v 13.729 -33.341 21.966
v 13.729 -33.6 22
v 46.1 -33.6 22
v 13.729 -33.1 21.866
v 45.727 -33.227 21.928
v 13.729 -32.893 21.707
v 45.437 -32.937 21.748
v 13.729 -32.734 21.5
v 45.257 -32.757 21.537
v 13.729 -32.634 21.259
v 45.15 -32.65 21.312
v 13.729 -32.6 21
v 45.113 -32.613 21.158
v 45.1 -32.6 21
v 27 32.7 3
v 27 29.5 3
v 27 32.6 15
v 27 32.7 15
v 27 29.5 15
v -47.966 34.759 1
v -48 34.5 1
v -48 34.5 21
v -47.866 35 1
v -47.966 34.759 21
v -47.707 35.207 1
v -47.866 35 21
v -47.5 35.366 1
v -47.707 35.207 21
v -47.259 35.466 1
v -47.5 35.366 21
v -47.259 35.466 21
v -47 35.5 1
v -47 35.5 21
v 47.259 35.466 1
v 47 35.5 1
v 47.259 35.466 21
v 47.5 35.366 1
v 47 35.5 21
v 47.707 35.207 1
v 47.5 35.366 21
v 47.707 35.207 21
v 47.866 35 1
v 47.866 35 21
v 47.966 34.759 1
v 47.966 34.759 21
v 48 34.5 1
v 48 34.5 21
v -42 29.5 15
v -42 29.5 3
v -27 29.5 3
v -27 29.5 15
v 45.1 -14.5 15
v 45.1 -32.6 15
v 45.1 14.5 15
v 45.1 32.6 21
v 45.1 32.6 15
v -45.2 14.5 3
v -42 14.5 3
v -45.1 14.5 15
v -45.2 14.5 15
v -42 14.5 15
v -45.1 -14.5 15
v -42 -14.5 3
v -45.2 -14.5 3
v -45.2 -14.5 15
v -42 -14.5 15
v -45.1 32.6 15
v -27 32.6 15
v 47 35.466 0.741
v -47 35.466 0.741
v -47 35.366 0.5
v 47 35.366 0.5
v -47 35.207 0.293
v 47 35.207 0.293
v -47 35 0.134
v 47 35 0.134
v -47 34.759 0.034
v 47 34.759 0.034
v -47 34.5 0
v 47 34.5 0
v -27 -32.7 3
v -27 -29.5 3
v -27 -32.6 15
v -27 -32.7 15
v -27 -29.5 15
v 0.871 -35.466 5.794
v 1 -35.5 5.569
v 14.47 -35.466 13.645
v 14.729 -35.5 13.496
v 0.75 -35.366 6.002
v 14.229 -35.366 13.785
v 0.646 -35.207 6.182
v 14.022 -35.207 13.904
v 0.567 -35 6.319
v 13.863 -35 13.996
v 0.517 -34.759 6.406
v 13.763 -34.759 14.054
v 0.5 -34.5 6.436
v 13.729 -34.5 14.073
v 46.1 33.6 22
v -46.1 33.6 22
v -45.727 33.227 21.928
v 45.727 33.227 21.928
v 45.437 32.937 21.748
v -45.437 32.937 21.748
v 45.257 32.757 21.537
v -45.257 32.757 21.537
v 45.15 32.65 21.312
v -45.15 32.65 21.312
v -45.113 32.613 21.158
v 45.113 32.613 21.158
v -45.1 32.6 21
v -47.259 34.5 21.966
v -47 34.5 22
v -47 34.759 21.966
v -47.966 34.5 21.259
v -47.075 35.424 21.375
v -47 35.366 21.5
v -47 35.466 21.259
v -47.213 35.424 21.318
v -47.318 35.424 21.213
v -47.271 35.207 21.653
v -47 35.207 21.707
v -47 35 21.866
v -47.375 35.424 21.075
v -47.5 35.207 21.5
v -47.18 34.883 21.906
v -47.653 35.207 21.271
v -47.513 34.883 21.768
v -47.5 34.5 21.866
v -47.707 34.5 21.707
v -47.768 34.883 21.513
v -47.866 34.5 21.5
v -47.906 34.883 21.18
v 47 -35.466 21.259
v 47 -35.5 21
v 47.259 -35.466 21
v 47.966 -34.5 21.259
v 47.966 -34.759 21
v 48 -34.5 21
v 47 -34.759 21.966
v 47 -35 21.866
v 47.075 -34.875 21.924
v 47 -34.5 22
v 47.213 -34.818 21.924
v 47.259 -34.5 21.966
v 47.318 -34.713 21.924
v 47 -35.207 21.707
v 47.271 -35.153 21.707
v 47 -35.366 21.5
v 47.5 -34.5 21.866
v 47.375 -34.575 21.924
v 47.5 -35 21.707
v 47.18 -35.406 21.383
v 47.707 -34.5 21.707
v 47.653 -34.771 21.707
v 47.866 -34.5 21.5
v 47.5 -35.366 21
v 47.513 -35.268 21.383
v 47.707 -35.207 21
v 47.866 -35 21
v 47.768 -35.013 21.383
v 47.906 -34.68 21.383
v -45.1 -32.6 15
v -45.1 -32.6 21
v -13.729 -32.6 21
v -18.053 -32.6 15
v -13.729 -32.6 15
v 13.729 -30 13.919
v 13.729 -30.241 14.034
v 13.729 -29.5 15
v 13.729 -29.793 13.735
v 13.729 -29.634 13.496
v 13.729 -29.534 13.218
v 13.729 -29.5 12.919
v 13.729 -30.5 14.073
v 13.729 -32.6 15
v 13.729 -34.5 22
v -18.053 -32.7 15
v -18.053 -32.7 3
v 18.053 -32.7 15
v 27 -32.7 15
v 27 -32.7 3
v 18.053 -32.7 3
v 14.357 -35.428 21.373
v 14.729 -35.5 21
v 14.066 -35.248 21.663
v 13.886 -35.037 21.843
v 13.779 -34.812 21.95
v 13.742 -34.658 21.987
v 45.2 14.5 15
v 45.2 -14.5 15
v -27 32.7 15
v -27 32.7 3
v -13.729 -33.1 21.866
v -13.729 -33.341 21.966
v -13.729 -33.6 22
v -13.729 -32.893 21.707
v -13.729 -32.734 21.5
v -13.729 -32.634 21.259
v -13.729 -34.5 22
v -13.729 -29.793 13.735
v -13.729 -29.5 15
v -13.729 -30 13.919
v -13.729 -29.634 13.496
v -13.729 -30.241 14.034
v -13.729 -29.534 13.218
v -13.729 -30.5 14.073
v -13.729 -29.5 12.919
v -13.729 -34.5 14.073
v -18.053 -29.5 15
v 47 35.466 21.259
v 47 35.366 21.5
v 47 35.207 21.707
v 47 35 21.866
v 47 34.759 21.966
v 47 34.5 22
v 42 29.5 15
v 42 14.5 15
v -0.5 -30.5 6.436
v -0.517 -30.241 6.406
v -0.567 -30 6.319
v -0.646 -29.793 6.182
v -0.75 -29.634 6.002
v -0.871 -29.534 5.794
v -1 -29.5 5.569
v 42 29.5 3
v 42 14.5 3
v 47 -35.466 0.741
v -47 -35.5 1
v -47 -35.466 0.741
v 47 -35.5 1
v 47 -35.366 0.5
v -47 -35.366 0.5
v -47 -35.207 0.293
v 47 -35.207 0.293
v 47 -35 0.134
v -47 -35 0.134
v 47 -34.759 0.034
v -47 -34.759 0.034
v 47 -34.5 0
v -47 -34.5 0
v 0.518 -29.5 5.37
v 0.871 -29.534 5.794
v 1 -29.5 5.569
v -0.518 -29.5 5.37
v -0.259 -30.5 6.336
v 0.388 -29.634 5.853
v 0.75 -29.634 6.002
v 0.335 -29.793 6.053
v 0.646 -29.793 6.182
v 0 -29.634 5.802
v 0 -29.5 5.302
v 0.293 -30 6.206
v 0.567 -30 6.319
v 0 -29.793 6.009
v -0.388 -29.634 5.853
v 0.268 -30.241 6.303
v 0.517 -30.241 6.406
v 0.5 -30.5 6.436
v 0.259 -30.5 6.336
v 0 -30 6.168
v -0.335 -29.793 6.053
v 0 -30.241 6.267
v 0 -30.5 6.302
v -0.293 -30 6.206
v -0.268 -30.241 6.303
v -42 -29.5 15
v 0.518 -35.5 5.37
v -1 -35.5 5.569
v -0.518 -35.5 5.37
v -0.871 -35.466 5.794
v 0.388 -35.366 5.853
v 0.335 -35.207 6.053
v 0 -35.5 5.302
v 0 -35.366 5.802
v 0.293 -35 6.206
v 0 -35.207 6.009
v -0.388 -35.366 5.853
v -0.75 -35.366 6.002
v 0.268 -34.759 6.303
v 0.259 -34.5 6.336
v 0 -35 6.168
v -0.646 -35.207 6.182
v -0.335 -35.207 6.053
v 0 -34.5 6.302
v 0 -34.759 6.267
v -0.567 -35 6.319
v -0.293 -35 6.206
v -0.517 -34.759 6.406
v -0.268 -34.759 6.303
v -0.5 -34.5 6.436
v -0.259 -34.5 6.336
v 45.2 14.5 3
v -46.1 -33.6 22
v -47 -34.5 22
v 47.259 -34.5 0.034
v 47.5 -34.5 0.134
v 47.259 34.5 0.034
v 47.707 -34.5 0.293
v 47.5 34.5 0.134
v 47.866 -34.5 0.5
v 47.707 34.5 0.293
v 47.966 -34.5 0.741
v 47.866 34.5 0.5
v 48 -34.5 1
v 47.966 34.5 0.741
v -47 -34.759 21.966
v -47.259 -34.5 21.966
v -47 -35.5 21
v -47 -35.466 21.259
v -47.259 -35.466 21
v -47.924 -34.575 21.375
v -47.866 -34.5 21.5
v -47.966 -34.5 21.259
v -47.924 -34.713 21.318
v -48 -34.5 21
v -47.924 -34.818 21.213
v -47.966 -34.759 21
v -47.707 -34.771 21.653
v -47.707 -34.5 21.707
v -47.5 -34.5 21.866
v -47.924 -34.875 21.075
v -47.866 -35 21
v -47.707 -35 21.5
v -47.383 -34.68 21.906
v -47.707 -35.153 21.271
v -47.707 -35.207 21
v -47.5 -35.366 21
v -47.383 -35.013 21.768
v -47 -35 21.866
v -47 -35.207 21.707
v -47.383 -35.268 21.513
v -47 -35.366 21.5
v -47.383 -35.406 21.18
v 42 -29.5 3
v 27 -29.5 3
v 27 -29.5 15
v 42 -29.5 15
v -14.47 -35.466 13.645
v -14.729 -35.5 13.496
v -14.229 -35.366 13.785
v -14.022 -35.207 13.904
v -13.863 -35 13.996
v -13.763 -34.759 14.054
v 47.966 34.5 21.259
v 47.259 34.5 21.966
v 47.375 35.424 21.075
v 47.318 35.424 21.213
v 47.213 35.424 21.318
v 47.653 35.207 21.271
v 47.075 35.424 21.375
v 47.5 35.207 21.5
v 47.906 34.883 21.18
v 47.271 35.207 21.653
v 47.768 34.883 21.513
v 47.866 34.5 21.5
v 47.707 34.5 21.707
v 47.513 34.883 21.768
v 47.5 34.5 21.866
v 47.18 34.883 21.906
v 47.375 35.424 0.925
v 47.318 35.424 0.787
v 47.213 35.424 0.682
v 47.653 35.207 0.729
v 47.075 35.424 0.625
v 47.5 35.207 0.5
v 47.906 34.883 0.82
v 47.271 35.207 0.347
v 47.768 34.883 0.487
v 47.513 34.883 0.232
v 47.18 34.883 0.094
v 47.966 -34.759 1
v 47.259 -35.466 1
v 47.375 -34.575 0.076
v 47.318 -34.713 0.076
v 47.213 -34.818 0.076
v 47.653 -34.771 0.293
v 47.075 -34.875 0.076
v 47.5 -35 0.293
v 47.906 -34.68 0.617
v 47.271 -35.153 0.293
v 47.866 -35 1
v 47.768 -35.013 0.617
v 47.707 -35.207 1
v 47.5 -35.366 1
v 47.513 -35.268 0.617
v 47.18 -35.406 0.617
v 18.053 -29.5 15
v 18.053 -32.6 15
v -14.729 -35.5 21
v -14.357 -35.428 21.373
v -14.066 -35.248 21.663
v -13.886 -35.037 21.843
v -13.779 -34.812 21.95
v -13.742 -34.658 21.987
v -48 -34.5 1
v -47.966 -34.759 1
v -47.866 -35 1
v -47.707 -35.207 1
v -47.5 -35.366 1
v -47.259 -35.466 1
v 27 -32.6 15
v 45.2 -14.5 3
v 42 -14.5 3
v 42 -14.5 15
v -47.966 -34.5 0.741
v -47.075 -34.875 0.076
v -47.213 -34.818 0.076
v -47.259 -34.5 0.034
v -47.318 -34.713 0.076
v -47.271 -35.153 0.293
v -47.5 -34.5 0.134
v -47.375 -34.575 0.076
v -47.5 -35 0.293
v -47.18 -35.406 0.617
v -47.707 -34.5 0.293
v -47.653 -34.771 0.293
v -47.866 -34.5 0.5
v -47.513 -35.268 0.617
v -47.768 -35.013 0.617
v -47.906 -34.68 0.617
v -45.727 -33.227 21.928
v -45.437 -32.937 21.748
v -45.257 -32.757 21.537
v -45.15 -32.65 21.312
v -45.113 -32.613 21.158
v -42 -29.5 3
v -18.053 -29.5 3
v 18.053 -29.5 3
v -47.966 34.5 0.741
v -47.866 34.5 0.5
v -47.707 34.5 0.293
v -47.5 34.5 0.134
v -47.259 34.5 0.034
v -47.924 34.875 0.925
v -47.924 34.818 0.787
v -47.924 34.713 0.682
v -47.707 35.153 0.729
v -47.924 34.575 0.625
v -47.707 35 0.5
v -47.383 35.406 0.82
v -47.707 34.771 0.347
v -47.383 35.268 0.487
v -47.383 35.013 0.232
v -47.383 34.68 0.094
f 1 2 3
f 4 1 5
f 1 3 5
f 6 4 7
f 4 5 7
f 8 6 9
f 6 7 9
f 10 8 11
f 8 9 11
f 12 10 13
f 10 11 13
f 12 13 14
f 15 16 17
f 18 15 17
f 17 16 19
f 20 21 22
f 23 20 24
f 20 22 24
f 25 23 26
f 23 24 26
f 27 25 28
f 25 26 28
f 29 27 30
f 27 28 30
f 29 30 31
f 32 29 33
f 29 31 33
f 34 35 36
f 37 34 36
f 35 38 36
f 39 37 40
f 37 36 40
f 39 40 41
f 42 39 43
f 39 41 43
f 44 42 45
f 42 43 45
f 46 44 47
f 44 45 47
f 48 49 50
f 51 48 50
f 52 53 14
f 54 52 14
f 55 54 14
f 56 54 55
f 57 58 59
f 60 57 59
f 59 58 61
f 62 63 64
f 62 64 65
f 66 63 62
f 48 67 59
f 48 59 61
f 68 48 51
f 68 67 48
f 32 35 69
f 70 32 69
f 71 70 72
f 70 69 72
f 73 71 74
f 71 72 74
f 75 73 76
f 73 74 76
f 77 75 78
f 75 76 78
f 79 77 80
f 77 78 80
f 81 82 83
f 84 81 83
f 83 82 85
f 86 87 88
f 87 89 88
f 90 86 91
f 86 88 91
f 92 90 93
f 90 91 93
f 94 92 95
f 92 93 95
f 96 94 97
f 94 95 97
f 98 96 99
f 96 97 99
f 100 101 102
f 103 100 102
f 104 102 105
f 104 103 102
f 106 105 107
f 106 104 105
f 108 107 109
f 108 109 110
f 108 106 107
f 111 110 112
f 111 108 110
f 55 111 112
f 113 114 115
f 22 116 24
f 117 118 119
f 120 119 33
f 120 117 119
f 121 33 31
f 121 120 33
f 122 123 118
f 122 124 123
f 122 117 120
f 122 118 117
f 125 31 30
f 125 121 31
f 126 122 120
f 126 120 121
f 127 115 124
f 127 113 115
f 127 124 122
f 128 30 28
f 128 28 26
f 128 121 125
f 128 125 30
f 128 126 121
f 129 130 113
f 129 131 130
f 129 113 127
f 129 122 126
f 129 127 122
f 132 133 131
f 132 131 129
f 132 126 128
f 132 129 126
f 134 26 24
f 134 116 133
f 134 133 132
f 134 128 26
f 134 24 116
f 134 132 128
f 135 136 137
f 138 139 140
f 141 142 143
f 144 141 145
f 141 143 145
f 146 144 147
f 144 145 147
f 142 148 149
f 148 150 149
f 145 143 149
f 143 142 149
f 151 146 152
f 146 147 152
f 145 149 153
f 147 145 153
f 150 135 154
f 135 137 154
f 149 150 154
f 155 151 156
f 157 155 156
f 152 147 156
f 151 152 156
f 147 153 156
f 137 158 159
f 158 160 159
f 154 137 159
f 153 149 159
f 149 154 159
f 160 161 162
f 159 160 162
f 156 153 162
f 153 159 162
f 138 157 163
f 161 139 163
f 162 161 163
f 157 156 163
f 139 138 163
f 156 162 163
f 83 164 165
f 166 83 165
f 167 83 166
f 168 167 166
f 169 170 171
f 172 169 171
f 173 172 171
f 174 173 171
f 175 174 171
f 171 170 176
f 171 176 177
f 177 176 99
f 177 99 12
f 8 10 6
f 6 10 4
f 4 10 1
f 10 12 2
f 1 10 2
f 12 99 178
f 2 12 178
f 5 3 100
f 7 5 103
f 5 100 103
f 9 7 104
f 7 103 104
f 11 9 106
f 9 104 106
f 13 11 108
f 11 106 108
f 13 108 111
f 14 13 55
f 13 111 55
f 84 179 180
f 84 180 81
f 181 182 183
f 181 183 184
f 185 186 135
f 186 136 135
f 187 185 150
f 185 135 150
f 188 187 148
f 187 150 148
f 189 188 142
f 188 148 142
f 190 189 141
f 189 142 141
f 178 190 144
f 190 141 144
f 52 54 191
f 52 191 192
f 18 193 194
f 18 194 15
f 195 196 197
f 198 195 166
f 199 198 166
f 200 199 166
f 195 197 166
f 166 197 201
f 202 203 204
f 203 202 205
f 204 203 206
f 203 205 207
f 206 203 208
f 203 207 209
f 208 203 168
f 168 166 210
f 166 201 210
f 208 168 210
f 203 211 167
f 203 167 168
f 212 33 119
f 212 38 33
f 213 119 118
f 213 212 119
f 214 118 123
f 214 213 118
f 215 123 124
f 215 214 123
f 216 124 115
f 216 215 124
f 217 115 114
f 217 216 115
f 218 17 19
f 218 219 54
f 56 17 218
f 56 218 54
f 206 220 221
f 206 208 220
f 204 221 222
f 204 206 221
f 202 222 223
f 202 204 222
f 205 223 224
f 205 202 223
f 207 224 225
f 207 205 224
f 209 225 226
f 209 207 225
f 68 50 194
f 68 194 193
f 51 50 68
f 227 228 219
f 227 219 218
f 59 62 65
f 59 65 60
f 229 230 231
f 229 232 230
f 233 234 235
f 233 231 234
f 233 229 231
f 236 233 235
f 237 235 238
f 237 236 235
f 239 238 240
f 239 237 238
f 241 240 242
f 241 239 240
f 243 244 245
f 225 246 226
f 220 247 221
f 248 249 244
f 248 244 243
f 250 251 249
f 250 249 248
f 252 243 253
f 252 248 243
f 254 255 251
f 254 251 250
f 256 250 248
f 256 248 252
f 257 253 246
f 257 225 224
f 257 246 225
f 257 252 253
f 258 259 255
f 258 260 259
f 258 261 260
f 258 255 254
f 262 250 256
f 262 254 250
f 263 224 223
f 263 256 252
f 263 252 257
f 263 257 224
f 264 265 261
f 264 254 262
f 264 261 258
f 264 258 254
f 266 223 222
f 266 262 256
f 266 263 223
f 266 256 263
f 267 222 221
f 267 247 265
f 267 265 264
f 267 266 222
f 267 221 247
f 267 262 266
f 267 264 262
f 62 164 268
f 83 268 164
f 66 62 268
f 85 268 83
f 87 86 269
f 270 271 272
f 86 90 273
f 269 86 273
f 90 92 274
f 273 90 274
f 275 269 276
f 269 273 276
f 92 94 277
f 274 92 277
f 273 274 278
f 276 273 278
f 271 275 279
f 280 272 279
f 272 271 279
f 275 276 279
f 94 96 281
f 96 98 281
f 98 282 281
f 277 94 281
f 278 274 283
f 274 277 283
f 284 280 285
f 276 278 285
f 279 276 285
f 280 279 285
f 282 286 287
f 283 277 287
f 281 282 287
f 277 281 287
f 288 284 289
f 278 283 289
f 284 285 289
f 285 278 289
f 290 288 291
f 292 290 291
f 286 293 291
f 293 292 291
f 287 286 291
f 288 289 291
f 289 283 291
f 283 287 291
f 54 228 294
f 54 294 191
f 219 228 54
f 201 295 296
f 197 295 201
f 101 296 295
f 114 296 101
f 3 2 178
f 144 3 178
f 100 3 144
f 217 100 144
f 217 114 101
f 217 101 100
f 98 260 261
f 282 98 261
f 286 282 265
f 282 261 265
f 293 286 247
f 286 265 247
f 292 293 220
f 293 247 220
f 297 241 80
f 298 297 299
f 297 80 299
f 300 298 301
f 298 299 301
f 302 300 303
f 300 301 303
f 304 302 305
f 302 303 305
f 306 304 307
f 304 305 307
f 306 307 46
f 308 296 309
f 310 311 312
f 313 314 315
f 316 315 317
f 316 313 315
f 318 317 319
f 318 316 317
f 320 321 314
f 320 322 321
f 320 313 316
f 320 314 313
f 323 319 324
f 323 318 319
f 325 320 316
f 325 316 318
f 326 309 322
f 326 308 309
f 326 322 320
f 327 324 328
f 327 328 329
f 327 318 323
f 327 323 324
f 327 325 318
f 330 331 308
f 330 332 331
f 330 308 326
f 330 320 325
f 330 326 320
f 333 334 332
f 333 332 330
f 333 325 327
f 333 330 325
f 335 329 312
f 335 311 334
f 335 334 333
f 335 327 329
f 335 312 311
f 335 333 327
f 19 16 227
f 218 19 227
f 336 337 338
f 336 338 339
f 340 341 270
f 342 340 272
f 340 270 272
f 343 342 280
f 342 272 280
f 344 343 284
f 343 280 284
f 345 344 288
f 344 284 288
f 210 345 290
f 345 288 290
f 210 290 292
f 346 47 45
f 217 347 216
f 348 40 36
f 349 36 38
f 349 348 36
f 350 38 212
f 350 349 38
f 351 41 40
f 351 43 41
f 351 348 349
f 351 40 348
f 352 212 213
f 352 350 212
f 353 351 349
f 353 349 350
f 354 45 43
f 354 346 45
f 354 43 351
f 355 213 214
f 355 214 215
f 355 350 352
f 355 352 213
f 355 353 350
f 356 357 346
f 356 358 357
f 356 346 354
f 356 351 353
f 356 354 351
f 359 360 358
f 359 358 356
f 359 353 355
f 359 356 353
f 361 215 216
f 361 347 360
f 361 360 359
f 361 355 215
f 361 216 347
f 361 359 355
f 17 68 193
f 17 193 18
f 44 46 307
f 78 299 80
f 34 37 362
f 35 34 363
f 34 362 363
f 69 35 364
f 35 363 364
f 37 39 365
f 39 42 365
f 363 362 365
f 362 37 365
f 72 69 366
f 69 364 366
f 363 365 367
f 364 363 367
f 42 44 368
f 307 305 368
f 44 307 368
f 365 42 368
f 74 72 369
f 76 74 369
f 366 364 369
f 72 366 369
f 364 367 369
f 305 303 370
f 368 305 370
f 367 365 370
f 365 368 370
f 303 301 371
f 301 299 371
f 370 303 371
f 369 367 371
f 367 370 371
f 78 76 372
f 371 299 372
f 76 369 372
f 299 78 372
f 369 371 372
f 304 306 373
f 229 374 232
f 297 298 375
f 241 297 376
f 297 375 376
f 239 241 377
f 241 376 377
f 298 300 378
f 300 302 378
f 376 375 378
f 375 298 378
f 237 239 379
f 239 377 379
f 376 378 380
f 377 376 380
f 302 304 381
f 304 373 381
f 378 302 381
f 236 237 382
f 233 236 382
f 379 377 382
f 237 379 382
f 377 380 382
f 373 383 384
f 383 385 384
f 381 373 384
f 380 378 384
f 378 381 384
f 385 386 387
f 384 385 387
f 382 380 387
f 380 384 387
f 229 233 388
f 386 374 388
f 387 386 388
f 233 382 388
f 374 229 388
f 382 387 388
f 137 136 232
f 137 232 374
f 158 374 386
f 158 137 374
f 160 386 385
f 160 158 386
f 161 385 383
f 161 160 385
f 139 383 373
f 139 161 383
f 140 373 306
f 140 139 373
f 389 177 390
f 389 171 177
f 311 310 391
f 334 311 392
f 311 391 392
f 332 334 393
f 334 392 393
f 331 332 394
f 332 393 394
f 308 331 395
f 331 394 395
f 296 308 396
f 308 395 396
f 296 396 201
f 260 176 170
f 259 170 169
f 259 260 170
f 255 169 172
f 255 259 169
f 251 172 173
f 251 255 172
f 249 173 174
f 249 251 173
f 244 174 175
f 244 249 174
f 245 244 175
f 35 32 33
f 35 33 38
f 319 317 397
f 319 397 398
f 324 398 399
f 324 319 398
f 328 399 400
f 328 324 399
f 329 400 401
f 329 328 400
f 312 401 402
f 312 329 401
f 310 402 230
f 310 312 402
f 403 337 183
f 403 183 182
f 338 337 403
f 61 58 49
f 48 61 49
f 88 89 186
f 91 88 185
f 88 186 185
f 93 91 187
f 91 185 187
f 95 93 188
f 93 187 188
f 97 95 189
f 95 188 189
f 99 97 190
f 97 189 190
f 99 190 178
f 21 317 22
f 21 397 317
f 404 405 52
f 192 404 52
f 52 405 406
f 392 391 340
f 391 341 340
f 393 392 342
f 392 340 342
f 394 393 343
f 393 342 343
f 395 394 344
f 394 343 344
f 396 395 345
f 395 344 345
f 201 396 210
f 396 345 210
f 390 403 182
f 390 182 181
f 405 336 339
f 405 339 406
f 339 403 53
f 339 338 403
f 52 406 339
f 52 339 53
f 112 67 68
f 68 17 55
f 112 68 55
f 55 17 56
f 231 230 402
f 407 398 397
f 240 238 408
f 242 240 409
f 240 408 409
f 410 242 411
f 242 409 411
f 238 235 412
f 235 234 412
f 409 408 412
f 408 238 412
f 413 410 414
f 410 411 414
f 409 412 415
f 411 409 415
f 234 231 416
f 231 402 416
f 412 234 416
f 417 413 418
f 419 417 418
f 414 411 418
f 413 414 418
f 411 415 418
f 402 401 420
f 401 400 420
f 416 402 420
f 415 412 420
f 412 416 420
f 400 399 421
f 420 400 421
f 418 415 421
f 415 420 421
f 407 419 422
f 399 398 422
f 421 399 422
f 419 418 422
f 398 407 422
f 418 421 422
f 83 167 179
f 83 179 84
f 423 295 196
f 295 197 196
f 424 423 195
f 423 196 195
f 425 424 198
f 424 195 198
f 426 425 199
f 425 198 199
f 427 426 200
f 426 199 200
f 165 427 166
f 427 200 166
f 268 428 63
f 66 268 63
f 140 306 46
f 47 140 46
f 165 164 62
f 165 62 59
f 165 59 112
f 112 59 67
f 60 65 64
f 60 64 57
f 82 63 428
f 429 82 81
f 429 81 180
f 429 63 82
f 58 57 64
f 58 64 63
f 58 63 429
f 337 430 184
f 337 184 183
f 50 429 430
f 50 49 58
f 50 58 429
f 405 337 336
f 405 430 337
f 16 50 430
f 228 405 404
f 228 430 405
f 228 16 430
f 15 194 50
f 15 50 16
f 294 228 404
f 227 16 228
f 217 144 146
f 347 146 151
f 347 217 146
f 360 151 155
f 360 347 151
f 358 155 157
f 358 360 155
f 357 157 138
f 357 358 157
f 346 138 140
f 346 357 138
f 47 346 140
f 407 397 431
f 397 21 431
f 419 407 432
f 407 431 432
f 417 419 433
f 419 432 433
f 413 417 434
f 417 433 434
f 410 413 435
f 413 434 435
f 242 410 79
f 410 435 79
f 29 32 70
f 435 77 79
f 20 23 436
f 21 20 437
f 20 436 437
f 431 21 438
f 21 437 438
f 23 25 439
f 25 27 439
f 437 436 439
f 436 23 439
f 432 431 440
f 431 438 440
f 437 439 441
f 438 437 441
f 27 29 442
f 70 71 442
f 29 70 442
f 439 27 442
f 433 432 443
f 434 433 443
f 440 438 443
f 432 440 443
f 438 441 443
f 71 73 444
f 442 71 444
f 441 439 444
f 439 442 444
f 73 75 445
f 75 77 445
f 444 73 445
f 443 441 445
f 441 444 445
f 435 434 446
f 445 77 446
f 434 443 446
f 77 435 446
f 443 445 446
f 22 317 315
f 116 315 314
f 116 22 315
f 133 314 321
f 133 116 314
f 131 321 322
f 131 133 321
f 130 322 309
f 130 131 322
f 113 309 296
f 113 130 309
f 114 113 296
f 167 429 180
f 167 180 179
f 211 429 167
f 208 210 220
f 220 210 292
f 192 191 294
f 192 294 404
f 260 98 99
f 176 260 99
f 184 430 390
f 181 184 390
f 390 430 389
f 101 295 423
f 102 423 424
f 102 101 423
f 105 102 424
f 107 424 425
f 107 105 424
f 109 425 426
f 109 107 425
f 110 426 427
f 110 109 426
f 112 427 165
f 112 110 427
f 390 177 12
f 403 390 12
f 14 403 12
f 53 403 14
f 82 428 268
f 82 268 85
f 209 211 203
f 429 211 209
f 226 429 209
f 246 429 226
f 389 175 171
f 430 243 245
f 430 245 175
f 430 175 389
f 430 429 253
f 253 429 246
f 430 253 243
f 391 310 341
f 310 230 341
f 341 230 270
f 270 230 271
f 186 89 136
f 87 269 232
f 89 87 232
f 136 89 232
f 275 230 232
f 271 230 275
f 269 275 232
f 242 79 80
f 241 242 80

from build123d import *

# Parameters (mm, degrees)
F0_W      = 84
F0_H      = 59
F1_DEPTH  = 3
F0_W_2    = 90.2
F0_H_2    = 65.2
F2_DEPTH  = 15
F0_W_3    = 96
F0_H_3    = 71
F3_DEPTH  = 22
F5_DEPTH  = 6.5
F6_W      = 29
F6_H      = 12
F7_DEPTH  = 3.2
F8_W      = 29
F8_H      = 12
F9_DEPTH  = 3.2
F10_W     = 8.9470923394
F10_H     = 12
F11_DEPTH = 3.2
F12_W     = 54
F12_H     = 12
F13_DEPTH = 3.2
F14_R     = 1


with BuildPart() as f1:
    # F0 (on Top) → F1 (new body)
    with BuildSketch(Plane.XY):
        Rectangle(F0_W, F0_H)
    extrude(amount=F1_DEPTH)

    # F0 (on Top) → F2 (join)
    with BuildSketch(Plane.XY):
        Rectangle(F0_W_2, F0_H_2)
        Rectangle(F0_W, F0_H, mode=Mode.SUBTRACT)
    extrude(amount=F2_DEPTH)

    # F0 (on Top) → F3 (join)
    with BuildSketch(Plane.XY):
        Rectangle(F0_W_3, F0_H_3)
        Rectangle(F0_W_2, F0_H_2, mode=Mode.SUBTRACT)
    extrude(amount=F3_DEPTH)

    # F4 (on face) → F5 (cut)
    with BuildSketch(Plane.XZ.offset(35.5)):
        Polygon((13.7292444706, 14.0734170091), (13.7292444706, 22), (-13.7292444706, 22), (-13.7292444706, 14.0734170091), (0, 6.1468340183), align=None)
    extrude(amount=-F5_DEPTH, mode=Mode.SUBTRACT)

    # F6 (on face) → F7 (cut)
    with BuildSketch(Plane.YZ.offset(-42)):
        with Locations((0, 9)):
            Rectangle(F6_W, F6_H)
    extrude(amount=-F7_DEPTH, mode=Mode.SUBTRACT)

    # F8 (on face) → F9 (cut)
    with BuildSketch(Plane(origin=(42, 0, 0), x_dir=(0, -1, 0), z_dir=(-1, 0, 0))):
        with Locations((0, 9)):
            Rectangle(F8_W, F8_H)
    extrude(amount=-F9_DEPTH, mode=Mode.SUBTRACT)

    # F10 (on face) → F11 (cut)
    with BuildSketch(Plane(origin=(0, -29.5, 0), x_dir=(-1, 0, 0), z_dir=(0, 1, 0))):
        with Locations((-22.5264538303, 9)):
            Rectangle(F10_W, F10_H)
        with Locations((22.5264538303, 9)):
            Rectangle(F10_W, F10_H)
    extrude(amount=-F11_DEPTH, mode=Mode.SUBTRACT)

    # F12 (on face) → F13 (cut)
    with BuildSketch(Plane.XZ.offset(-29.5)):
        with Locations((0, 9)):
            Rectangle(F12_W, F12_H)
    extrude(amount=-F13_DEPTH, mode=Mode.SUBTRACT)

    # F14
    f14_edges = [f1.edges().sort_by_distance(p)[0] for p in [
        (-30.864622, -35.5, 22),
        (-48, 0, 22),
        (-48, -35.5, 11),
        (48, -35.5, 11),
        (48, 0, 0),
        (0, -35.5, 0),
        (30.864622, -35.5, 22),
        (6.864622, -35.5, 10.110126),
        (-6.864622, -35.5, 10.110126),
        (-13.729244, -35.5, 18.036709),
        (13.729244, -35.5, 18.036709),
        (48, 0, 22),
        (48, 35.5, 11),
        (0, 35.5, 22),
        (0, 35.5, 0),
        (-48, 35.5, 11),
        (-48, 0, 0),
        (0, 32.6, 22),
        (-45.1, 0, 22),
        (45.1, 0, 22),
        (29.414622, -32.6, 22),
        (-29.414622, -32.6, 22),
        (6.864622, -29.5, 10.110126),
        (-6.864622, -29.5, 10.110126),
        (0, -32.5, 6.146834),
    ]]
    fillet(f14_edges, radius=F14_R)


solid = f1.part
